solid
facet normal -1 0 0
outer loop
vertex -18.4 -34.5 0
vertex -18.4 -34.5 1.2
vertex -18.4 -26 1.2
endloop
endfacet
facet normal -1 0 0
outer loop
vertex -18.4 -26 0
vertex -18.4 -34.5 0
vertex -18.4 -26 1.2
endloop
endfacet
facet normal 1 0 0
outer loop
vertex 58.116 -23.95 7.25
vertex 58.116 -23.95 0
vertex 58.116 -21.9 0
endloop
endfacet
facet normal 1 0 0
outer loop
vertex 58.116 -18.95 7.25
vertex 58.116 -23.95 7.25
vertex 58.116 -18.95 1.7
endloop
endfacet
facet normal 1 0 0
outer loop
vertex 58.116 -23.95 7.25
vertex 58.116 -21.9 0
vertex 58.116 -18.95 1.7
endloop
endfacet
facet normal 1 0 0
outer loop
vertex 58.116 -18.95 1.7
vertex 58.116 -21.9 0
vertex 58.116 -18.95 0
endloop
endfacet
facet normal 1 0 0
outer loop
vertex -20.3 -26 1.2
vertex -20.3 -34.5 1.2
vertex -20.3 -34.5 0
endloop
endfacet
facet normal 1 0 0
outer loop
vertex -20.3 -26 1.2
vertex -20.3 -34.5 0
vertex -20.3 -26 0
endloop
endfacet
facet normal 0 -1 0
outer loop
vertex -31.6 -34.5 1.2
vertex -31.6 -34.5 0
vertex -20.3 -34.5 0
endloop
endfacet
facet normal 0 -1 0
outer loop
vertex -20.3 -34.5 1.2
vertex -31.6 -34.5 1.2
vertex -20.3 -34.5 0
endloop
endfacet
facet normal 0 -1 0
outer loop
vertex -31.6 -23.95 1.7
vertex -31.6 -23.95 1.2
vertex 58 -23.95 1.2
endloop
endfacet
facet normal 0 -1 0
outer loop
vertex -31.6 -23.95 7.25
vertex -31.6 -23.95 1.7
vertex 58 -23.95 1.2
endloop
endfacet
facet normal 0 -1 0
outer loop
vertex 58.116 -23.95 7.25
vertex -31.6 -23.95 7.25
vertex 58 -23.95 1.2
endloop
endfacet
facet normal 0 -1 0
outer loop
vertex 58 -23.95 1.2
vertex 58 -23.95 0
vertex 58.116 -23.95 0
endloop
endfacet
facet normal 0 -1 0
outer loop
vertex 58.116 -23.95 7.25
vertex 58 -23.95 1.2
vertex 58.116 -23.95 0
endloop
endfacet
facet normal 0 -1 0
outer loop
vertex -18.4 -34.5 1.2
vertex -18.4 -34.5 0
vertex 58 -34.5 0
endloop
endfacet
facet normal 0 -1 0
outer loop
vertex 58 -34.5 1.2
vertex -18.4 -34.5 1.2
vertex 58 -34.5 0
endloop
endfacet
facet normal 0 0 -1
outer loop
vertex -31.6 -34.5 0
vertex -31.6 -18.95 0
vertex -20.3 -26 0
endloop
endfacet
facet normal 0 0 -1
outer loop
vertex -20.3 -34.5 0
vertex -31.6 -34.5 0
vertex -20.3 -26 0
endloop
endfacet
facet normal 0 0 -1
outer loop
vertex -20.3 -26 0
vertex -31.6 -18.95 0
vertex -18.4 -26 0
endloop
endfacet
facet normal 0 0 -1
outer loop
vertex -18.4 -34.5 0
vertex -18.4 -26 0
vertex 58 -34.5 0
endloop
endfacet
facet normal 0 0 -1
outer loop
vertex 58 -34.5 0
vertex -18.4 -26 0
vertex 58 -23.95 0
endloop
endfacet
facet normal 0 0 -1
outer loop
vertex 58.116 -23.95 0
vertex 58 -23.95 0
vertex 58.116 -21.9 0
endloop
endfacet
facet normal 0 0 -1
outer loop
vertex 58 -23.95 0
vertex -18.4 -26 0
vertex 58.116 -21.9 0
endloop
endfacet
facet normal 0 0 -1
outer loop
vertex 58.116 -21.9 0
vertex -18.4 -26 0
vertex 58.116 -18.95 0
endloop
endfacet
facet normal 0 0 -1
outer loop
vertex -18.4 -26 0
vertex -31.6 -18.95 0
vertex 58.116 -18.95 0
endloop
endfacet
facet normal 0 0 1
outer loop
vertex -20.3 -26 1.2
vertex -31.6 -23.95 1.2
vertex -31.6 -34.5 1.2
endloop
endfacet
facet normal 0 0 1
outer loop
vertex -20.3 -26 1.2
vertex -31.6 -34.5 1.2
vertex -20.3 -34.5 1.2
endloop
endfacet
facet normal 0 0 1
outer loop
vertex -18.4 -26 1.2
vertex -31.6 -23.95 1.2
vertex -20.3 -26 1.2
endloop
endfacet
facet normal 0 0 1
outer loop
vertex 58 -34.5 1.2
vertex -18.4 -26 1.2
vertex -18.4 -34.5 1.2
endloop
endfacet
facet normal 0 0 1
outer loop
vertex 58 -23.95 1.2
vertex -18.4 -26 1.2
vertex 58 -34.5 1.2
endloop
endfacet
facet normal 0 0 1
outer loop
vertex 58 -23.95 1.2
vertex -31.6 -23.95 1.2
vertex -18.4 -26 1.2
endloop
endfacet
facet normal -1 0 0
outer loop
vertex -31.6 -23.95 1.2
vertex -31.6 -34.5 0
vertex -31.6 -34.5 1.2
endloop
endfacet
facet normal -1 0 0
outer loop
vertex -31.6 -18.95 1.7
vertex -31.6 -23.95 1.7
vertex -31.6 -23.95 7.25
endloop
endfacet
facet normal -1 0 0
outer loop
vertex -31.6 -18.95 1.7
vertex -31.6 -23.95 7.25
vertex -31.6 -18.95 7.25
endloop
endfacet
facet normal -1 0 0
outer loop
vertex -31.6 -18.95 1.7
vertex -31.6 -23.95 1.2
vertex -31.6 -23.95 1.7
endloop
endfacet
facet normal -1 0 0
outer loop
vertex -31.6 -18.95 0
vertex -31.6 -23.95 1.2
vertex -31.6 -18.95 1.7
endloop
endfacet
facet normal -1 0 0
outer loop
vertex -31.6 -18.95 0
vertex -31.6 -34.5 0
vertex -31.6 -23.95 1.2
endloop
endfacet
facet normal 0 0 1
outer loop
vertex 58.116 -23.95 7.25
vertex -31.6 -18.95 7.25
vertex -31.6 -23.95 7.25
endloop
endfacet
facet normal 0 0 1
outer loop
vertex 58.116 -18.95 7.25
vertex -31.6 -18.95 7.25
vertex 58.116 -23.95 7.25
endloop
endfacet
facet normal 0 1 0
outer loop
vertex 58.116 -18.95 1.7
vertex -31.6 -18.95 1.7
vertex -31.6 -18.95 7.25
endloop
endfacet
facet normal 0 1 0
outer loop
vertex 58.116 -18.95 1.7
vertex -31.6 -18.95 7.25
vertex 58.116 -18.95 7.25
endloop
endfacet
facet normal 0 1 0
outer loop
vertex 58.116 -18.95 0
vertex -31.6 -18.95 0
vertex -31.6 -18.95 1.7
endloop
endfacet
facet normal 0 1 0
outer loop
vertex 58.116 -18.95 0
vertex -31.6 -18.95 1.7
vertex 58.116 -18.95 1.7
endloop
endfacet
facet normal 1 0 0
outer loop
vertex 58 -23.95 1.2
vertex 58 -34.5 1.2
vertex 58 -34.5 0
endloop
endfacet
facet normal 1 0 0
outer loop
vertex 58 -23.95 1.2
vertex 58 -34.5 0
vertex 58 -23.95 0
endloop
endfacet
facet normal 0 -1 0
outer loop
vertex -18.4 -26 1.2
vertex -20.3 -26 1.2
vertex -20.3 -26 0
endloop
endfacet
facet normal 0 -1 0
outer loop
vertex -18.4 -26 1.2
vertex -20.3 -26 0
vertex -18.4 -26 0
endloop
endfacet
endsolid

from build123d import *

# Parameters (mm, degrees)
F0_W     = 153
F0_H     = 69
F1_DEPTH = 1.7
F2_W     = 15
F2_H     = 4.6
F2_W_2   = 8
F2_W_3   = 1.9
F2_H_2   = 8.5
F2_W_4   = 18.5
F2_H_3   = 12.6
F2_R     = 2
F2_R_2   = 1.7
F2_W_5   = 6.6
F2_H_4   = 2.1
F3_DEPTH = 1.701
F4_W     = 89.7158287823
F4_H     = 5
F5_DEPTH = 1.701
F6_DEPTH = 7.25
F8_DEPTH = 7.251
F9_DEPTH = 0.5


with BuildPart() as f1:
    # F0 (on Top) → F1 (new body)
    with BuildSketch(Plane.XY):
        Rectangle(F0_W, F0_H)
    extrude(amount=F1_DEPTH)

    # F2 (on face) → F3 (cut, through all)
    with BuildSketch(Plane.XY.offset(1.7)):
        with Locations((-69, -32.2)):
            Rectangle(F2_W, F2_H)
        Polygon((-61.5, -29.9), (-61.5, -34.5), (-43.1, -34.5), (-43.1, -29.9), (-43.1, -21.9), (-61.5, -21.9), align=None)
        with Locations((-39.1, -32.2)):
            Rectangle(F2_W_2, F2_H)
        Polygon((-35.1, -29.9), (-35.1, -34.5), (-31.6, -34.5), (-31.6, -21.9), (-35.1, -21.9), align=None)
        with Locations((-19.35, -30.25)):
            Rectangle(F2_W_3, F2_H_2)
        with Locations((67.25, -28.2)):
            Rectangle(F2_W_4, F2_H_3)
        with Locations((-69, -24.9)):
            Circle(F2_R)
        with Locations((-69, 19.1)):
            Circle(F2_R)
        with Locations((71.5, 18.8)):
            Circle(F2_R_2)
        with Locations((71.5, -6.2)):
            Circle(F2_R_2)
        with Locations((41.5, 18.8)):
            Circle(F2_R_2)
        with Locations((41.5, -6.2)):
            Circle(F2_R_2)
        with Locations((-38.5, 29.05)):
            Rectangle(F2_W_5, F2_H_4)
        with Locations((-38.5, 8.55)):
            Rectangle(F2_W_5, F2_H_4)
        with Locations((-38.5, -16.45)):
            Rectangle(F2_W_5, F2_H_4)
        with Locations((-38.5, 4.05)):
            Rectangle(F2_W_5, F2_H_4)
        with Locations((61.5, 29.05)):
            Rectangle(F2_W_5, F2_H_4)
        with Locations((61.5, 8.55)):
            Rectangle(F2_W_5, F2_H_4)
        with Locations((61.5, 4.05)):
            Rectangle(F2_W_5, F2_H_4)
        with Locations((61.5, -16.45)):
            Rectangle(F2_W_5, F2_H_4)
        with Locations((-18.5, 18.8)):
            Circle(F2_R_2)
        with Locations((-48.5, 18.8)):
            Circle(F2_R_2)
        with Locations((-18.5, -6.2)):
            Circle(F2_R_2)
        with Locations((-48.5, -6.2)):
            Circle(F2_R_2)
    extrude(amount=-F3_DEPTH, mode=Mode.SUBTRACT)

    # F4 (on Top) → F5 (cut, through all)
    with BuildSketch(Plane.XY):
        with Locations((13.2579143912, -21.45)):
            Rectangle(F4_W, F4_H)
    extrude(amount=F5_DEPTH, mode=Mode.SUBTRACT)

    # F4 (on Top) → F6 (join)
    with BuildSketch(Plane.XY):
        with Locations((13.2579143912, -21.45)):
            Rectangle(F4_W, F4_H)
    extrude(amount=F6_DEPTH)

    # F7 (on Top) → F8 (cut, through all)
    with BuildSketch(Plane.XY):
        Polygon((76.5, -21.9), (76.5, 34.5), (-76.5, 34.5), (-76.5, -29.9), (-61.5, -29.9), (-61.5, -21.9), (-43.1, -21.9), (-43.1, -29.9), (-35.1, -29.9), (-35.1, -21.9), (-31.6, -21.9), (-31.6, -18.95), (58.1158287823, -18.95), (58.1158287823, -21.9), align=None)
    extrude(amount=F8_DEPTH, mode=Mode.SUBTRACT)

    # F9 (cut): a face of the model
    f9_faces = [f1.faces().sort_by_distance(p)[0] for p in [
        (13.7657792774, -29.2071836019, 1.7),
    ]]
    extrude(f9_faces, amount=-F9_DEPTH, mode=Mode.SUBTRACT)


solid = f1.part
